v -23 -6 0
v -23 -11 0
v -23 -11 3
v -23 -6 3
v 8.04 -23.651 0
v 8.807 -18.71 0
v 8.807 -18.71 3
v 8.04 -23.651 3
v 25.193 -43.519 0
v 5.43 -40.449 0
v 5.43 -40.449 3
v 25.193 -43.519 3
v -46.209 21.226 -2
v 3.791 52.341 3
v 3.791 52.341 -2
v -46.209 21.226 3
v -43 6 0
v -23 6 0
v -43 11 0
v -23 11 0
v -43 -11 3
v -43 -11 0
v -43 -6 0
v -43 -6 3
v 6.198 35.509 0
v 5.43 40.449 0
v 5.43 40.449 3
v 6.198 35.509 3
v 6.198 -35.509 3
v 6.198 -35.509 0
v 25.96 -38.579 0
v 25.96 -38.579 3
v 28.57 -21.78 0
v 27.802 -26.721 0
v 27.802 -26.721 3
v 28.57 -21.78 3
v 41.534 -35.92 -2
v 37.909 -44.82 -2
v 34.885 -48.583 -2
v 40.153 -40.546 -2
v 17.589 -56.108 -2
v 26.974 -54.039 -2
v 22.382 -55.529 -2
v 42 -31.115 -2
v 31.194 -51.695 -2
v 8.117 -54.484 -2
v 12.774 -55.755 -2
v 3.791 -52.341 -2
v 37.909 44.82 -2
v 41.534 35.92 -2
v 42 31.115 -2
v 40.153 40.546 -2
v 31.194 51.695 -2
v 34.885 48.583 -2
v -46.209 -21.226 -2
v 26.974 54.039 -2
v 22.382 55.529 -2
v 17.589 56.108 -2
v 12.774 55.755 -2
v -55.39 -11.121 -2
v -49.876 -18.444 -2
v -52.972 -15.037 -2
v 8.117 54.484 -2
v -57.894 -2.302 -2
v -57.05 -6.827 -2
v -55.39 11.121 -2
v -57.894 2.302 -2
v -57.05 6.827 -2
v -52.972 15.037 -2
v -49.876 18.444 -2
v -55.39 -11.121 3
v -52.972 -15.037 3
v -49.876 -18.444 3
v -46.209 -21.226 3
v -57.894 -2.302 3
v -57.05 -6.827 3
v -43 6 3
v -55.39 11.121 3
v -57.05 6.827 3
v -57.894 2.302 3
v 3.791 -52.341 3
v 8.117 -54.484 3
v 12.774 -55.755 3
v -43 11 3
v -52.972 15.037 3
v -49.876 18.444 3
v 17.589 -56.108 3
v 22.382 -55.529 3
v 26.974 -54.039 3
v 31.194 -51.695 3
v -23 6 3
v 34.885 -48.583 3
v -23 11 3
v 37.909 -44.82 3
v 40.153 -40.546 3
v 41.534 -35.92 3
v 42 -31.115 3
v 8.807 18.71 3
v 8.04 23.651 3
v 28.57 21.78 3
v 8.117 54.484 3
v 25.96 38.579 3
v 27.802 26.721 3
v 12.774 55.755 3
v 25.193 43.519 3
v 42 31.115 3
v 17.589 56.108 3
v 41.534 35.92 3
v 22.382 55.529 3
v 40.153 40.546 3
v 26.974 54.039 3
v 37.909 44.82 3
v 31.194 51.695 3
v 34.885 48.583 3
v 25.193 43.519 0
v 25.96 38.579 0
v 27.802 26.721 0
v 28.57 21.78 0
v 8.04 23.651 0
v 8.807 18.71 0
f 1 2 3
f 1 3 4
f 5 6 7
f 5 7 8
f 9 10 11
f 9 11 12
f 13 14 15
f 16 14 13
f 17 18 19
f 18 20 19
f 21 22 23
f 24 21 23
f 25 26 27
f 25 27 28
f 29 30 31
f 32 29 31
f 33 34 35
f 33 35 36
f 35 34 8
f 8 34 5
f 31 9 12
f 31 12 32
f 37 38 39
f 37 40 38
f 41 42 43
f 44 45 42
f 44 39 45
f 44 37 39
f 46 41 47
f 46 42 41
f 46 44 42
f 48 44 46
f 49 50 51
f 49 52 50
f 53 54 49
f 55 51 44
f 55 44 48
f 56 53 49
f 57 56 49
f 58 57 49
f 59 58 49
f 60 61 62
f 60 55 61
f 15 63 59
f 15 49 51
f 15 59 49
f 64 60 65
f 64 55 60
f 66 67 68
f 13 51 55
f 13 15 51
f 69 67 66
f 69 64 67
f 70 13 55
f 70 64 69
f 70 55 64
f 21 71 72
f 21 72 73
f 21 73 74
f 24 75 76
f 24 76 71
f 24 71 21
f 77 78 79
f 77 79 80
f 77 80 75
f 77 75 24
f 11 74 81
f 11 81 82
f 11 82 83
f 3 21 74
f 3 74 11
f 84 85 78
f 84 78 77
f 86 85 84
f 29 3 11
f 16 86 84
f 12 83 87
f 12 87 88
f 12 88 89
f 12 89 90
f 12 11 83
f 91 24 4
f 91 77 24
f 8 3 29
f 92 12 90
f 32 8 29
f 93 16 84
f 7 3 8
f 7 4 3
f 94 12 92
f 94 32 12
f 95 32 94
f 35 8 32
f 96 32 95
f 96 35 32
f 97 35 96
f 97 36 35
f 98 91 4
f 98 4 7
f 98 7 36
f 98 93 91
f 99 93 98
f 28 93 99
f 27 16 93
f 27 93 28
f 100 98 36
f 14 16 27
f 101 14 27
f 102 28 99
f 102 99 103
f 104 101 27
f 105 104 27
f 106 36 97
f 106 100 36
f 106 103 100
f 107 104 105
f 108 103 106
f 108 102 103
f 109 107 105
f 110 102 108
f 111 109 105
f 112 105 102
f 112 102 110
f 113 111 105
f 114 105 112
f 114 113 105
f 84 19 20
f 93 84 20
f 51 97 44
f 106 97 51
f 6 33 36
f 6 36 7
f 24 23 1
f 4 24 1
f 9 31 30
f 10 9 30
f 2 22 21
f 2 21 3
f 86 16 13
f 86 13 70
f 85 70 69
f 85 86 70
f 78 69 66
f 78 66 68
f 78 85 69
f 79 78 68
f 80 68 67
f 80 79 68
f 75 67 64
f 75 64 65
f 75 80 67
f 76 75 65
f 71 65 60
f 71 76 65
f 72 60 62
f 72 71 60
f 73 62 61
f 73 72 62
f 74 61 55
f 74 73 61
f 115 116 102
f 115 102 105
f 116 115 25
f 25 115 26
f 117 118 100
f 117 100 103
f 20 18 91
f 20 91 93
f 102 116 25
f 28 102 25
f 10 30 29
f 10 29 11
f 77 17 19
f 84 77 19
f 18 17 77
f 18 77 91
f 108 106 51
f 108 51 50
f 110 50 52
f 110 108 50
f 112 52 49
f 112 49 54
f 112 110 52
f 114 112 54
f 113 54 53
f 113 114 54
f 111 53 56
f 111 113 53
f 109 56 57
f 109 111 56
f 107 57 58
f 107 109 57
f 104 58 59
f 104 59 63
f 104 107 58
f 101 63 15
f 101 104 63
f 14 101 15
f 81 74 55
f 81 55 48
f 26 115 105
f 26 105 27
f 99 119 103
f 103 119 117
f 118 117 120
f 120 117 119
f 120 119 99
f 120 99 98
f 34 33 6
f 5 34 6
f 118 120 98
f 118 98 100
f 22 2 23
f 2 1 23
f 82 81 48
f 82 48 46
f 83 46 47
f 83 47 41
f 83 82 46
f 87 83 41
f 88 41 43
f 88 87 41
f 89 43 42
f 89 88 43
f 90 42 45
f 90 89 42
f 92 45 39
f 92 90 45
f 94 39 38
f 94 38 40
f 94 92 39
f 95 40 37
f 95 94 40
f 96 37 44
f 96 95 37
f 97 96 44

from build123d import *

# Parameters (mm, degrees)
IZIM1_R                     = 65
IZIM1_W                     = 20
IZIM1_H                     = 5
Y_KSEKLIK_EKSTR_ZYON1_DEPTH = 3
Y_KSEKLIK_EKSTR_ZYON2_START = 2
IZIM2_R                     = 65
Y_KSEKLIK_EKSTR_ZYON2_DEPTH = 2
SKETCH1_OUTSIDE_W           = 168.784
SKETCH1_OUTSIDE_H           = 168.784
CUT_EXTRUDE1_DEPTH          = 10


with BuildPart() as part:
    # Çizim1 → Yükseklik-Ekstrüzyon1 (new body)
    with BuildSketch(Plane.XY):
        Circle(IZIM1_R)
        Polygon((6.197521384, -35.508725619), (5.430030224, -40.449470231), (25.193008671, -43.519434871), (25.960499832, -38.578690259), (16.079010608, -37.043707939), align=None, mode=Mode.SUBTRACT)
        Polygon((8.806991329, -18.710193939), (8.039500168, -23.650938551), (17.920989392, -25.185920871), (27.802478616, -26.720903191), (28.569969776, -21.780158579), align=None, mode=Mode.SUBTRACT)
        with Locations((-33, -8.5)):
            Rectangle(IZIM1_W, IZIM1_H, mode=Mode.SUBTRACT)
        with Locations((-33, 8.5)):
            Rectangle(IZIM1_W, IZIM1_H, mode=Mode.SUBTRACT)
        Polygon((17.920989392, 25.185920871), (8.039500168, 23.650938551), (8.806991329, 18.710193939), (28.569969776, 21.780158579), (27.802478616, 26.720903191), align=None, mode=Mode.SUBTRACT)
        Polygon((16.079010608, 37.043707939), (25.960499832, 38.578690259), (25.193008671, 43.519434871), (5.430030224, 40.449470231), (6.197521384, 35.508725619), align=None, mode=Mode.SUBTRACT)
    extrude(amount=Y_KSEKLIK_EKSTR_ZYON1_DEPTH)

    # Çizim2 → Yükseklik-Ekstrüzyon2 (add)
    with BuildSketch(Plane(origin=(0, 0, 0), x_dir=(-1, 0, 0), z_dir=(0, 0, -1)).offset(Y_KSEKLIK_EKSTR_ZYON2_START)):
        Circle(IZIM2_R)
    extrude(amount=-Y_KSEKLIK_EKSTR_ZYON2_DEPTH)

    # Sketch1 outside → Cut-Extrude1 (cut)
    with BuildSketch(Plane.XY.offset(3)):
        Rectangle(SKETCH1_OUTSIDE_W, SKETCH1_OUTSIDE_H)
        with BuildLine():
            Line((-46.208680474, -21.225709885), (3.791319526, -52.34052429))
            ThreePointArc((3.791319526, -52.34052429), (29.140489861, -52.969070419), (42, -31.114814405))
            Line((42, -31.114814405), (42, 31.114814405))
            ThreePointArc((42, 31.114814405), (29.140489861, 52.969070419), (3.791319526, 52.34052429))
            Line((3.791319526, 52.34052429), (-46.208680474, 21.225709885))
            ThreePointArc((-46.208680474, 21.225709885), (-58, 0), (-46.208680474, -21.225709885))
        make_face(mode=Mode.SUBTRACT)
    extrude(amount=-CUT_EXTRUDE1_DEPTH, mode=Mode.SUBTRACT)


solid = part.part
